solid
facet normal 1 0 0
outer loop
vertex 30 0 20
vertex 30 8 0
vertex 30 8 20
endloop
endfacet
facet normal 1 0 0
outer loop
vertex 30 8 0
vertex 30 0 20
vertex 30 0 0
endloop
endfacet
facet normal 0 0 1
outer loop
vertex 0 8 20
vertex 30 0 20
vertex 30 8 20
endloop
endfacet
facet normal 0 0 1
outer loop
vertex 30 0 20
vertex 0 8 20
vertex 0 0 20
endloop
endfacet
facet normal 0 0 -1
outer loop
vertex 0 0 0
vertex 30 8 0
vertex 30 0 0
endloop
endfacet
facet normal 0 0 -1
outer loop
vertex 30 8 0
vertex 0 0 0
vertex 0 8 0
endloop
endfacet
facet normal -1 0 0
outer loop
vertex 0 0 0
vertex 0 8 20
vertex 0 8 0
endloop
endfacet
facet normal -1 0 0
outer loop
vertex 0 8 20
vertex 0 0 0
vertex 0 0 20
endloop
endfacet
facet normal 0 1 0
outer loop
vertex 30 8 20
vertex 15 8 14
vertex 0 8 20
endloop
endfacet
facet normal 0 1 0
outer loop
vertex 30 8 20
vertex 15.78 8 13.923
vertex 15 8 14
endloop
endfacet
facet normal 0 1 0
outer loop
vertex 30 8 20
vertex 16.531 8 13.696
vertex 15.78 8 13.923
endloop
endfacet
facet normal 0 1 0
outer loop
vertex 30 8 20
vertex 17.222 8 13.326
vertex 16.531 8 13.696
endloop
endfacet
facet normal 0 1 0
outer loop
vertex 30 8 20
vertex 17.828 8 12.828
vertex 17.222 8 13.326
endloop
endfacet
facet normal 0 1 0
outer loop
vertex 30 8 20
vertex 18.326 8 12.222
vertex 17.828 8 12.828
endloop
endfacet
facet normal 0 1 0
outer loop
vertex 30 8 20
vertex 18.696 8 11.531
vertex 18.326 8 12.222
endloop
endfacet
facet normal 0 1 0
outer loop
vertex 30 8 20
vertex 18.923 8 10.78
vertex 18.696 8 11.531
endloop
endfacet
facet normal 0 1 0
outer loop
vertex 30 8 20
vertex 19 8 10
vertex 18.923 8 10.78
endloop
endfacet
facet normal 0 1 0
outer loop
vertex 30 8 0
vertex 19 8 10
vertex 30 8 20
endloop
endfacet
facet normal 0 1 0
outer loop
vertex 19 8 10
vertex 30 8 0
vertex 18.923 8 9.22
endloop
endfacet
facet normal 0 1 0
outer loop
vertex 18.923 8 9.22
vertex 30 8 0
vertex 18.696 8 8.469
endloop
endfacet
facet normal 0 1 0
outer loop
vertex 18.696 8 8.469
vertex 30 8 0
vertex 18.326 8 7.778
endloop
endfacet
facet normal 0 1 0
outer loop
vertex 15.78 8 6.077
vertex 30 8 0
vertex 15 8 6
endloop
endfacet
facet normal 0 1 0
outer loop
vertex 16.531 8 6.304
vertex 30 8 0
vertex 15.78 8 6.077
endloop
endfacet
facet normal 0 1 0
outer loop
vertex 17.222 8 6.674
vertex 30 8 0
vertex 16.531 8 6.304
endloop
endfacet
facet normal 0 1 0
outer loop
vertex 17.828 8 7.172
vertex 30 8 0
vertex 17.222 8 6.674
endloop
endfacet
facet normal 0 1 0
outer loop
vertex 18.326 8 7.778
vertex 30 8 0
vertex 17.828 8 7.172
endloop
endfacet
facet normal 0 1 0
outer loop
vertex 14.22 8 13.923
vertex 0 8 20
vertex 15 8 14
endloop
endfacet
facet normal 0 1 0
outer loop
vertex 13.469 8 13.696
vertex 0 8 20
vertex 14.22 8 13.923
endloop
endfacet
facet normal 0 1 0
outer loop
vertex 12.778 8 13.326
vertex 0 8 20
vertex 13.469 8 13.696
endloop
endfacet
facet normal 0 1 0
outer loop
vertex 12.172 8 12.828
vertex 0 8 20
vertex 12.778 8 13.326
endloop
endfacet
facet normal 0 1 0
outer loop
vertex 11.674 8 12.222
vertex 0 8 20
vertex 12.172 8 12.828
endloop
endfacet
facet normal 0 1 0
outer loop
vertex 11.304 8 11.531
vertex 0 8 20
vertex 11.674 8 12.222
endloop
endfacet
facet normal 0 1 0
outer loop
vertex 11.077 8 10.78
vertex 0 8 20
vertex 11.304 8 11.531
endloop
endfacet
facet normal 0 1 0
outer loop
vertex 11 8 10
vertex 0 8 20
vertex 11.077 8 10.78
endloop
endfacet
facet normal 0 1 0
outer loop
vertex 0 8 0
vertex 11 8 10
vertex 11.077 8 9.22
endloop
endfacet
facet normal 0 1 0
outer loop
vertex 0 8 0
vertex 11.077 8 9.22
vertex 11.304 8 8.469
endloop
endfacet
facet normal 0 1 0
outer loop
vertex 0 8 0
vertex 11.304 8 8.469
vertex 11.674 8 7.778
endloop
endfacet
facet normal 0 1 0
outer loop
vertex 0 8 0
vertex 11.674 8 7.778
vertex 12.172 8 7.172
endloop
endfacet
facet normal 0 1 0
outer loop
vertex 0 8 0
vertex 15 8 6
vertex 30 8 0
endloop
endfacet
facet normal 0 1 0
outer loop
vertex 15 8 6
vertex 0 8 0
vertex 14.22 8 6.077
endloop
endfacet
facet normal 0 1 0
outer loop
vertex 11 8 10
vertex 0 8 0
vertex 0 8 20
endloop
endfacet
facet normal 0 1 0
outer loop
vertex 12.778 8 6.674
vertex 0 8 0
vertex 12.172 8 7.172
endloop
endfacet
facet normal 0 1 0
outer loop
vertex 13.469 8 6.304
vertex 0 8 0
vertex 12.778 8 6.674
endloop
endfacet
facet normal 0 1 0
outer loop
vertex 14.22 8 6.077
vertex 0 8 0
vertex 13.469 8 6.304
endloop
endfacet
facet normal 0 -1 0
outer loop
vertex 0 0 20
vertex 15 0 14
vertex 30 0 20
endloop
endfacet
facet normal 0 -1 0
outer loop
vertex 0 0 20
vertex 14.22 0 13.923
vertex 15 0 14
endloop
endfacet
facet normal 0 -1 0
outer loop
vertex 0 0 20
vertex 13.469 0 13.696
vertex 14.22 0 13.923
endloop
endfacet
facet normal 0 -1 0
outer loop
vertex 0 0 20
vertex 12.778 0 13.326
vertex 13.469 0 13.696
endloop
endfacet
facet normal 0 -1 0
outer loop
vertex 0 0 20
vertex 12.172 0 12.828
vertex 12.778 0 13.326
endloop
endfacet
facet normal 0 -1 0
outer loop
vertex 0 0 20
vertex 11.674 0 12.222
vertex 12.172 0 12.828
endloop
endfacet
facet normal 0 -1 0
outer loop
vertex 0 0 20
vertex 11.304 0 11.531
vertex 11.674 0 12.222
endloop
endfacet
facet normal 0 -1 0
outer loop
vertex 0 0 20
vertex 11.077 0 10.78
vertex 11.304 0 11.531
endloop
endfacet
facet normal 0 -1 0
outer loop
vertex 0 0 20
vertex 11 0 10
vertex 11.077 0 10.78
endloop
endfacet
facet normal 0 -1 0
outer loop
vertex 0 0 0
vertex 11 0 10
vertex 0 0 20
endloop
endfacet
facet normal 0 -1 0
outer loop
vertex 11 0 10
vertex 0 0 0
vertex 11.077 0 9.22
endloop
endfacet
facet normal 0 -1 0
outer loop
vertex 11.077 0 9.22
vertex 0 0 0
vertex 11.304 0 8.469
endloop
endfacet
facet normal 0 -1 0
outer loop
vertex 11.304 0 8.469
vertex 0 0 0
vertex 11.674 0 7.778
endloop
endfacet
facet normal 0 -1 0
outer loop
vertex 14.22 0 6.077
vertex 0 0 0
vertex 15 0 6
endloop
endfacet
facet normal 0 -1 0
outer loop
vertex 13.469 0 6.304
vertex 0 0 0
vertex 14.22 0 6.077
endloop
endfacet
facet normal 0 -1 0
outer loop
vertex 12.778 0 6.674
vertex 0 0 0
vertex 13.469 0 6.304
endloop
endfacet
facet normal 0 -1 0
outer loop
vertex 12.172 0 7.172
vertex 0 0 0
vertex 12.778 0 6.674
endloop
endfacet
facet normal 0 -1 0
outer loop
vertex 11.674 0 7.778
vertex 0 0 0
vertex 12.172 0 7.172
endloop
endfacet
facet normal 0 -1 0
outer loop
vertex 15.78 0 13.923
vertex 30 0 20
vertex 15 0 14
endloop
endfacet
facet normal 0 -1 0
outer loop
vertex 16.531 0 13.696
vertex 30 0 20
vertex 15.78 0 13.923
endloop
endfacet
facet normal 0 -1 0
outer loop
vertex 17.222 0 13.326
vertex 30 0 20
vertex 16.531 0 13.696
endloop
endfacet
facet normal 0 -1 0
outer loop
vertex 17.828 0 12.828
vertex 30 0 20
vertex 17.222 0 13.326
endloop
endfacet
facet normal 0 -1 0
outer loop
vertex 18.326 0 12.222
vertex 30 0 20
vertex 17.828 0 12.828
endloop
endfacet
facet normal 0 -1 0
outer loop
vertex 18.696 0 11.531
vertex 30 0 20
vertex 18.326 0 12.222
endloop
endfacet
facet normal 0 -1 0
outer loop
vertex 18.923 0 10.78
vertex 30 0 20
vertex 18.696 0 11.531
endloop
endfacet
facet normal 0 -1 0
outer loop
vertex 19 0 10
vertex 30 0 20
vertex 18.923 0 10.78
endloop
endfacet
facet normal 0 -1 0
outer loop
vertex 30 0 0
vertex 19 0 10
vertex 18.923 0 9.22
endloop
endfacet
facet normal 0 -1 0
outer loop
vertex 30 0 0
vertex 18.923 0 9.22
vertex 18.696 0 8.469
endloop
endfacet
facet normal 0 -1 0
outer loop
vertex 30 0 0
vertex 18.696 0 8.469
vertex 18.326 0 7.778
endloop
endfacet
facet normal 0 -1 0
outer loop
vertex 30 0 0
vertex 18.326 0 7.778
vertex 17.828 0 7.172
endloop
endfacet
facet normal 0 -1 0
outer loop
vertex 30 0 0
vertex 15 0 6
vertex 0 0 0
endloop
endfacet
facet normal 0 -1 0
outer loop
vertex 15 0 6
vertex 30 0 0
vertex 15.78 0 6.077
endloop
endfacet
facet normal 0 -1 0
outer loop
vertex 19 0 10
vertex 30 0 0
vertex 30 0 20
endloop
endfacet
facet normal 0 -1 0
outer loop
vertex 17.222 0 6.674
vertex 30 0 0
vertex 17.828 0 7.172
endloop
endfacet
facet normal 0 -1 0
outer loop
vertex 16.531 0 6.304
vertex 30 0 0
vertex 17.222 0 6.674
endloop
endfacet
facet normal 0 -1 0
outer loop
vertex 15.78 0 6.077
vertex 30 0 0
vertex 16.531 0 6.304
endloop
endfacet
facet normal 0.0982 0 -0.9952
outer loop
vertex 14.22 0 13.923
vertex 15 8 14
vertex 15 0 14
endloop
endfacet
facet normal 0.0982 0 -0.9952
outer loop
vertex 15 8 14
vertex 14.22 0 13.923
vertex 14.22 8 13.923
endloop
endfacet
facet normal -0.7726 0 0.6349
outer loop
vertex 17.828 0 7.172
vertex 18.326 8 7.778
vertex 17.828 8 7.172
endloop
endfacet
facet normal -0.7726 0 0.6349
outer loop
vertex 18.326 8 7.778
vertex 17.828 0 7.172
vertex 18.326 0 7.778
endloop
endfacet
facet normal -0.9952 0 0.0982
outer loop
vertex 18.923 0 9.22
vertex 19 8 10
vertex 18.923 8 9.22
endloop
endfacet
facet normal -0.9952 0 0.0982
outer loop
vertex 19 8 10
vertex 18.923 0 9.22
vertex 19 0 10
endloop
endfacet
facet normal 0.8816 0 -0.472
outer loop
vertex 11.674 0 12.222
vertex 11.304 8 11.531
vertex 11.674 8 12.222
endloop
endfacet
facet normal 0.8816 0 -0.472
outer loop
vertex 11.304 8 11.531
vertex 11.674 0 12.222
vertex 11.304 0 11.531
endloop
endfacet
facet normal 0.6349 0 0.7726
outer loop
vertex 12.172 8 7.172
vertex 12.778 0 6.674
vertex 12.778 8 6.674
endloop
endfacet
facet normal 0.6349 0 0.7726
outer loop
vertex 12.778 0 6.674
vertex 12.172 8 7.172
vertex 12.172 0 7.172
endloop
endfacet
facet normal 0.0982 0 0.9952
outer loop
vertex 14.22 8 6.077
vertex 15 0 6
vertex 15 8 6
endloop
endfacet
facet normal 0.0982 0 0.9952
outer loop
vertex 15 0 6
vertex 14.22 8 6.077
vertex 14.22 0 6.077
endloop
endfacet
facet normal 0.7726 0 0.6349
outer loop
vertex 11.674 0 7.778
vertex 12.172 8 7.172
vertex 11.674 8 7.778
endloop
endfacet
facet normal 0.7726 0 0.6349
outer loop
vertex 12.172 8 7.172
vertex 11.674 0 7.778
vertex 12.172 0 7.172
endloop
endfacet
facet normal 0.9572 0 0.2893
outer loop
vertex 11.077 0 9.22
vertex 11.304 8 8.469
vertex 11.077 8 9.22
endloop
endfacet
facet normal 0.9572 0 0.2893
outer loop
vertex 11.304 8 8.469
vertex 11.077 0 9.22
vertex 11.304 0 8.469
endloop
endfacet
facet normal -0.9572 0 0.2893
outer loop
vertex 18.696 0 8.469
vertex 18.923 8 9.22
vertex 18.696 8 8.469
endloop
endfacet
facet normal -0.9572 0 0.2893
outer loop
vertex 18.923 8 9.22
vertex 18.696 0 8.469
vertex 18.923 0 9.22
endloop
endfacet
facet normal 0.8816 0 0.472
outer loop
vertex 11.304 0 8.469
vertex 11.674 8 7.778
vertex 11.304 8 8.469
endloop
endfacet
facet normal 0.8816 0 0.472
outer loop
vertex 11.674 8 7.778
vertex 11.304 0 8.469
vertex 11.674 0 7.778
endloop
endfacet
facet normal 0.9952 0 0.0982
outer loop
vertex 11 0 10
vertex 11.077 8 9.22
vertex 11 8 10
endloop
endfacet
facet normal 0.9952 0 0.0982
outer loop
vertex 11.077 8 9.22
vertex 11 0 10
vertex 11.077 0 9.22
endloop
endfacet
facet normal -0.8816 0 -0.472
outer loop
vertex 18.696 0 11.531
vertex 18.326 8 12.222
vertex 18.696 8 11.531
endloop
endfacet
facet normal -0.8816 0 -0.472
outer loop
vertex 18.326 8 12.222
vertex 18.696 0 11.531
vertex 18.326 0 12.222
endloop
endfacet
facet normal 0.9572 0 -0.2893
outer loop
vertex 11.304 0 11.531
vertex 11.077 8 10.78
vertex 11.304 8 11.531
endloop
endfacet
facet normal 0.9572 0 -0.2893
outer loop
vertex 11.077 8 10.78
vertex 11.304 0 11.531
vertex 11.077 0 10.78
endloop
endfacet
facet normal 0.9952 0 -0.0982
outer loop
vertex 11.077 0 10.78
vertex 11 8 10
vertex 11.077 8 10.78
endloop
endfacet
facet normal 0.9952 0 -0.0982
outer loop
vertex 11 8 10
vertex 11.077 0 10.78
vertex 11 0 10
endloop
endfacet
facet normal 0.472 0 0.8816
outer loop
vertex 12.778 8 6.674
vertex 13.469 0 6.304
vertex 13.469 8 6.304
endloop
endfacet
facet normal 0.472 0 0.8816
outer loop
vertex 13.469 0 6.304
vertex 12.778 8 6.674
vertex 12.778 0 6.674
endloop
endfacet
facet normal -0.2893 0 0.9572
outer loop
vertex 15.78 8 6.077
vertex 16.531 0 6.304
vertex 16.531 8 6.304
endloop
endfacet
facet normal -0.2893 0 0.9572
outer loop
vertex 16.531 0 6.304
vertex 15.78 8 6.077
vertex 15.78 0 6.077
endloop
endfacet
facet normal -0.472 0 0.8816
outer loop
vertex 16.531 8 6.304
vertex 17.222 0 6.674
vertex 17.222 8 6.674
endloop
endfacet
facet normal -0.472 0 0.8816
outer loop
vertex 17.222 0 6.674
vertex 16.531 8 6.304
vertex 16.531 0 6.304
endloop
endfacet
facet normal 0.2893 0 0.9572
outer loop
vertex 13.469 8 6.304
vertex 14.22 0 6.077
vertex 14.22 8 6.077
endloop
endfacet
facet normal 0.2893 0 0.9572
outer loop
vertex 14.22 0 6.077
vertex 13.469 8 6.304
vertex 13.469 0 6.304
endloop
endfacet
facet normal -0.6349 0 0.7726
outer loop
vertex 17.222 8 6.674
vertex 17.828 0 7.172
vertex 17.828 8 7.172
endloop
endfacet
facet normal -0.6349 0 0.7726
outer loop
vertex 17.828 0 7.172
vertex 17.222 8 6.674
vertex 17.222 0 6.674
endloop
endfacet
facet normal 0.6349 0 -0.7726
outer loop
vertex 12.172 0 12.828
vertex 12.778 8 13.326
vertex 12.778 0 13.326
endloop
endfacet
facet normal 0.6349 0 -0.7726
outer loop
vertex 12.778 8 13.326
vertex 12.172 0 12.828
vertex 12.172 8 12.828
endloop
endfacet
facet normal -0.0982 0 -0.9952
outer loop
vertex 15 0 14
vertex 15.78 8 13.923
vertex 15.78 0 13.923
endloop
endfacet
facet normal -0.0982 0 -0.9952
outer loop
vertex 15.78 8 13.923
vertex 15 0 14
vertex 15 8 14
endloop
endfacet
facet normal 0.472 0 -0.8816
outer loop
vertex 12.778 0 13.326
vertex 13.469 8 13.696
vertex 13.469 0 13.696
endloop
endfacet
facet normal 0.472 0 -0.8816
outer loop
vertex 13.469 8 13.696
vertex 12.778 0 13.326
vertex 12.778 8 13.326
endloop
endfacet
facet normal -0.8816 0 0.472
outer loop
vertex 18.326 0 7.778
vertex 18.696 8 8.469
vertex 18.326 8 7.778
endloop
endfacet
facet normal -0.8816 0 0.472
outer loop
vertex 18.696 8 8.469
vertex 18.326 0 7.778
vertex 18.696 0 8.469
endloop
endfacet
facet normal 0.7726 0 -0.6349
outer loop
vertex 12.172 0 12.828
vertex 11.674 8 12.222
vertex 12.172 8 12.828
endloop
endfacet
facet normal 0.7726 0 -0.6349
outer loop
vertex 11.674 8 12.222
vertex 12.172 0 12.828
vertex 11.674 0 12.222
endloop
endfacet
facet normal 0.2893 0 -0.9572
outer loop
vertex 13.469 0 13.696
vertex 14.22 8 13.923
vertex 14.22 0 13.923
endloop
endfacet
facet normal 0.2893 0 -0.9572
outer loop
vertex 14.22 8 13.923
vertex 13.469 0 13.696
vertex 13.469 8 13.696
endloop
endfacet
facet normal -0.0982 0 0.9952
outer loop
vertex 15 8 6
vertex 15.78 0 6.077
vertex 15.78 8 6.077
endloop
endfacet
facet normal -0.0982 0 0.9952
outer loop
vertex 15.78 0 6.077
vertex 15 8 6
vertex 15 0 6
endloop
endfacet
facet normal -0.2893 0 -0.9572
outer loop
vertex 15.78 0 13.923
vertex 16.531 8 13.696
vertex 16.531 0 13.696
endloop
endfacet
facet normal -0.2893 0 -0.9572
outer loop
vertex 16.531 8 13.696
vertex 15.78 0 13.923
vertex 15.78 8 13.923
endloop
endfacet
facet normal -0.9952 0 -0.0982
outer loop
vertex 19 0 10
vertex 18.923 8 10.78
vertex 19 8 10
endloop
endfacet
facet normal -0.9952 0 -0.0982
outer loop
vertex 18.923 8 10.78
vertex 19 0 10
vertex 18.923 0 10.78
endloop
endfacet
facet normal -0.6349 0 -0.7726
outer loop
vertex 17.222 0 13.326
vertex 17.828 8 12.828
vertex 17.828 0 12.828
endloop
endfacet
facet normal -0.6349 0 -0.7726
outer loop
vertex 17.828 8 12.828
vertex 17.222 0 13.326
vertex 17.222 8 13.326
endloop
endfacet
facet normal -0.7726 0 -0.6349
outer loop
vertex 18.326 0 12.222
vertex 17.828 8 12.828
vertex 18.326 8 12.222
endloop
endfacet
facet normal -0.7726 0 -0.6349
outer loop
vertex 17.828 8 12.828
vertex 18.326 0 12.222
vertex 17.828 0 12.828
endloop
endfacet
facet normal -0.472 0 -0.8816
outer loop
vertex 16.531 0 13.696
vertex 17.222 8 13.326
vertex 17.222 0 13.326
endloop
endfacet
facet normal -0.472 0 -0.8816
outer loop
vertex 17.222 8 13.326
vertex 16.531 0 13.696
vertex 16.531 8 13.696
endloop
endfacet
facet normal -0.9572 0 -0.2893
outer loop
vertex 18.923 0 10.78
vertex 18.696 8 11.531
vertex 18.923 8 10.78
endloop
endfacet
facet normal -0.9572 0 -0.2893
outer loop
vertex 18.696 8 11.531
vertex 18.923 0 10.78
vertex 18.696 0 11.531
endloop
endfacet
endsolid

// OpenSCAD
// A 30 x 8 x 20 plate standing on its edge, with a pin hole through its thickness (along y).
//
// teardrop = false: the hole is round. The facets of its roof face down at up to 84 degrees from
//   vertical, past the 45 degree limit of an FDM printer, so QC reads them as an overhang and
//   attributes it to the "pin hole" feature declared below.
// teardrop = true: the hole's upper half is a house shape: vertical walls, then two flats rising
//   at 45 degrees to meet over the hole. The flats sit exactly at the limit, on whole-number
//   coordinates, so the mesh states their angle exactly and QC passes them.
teardrop = false;

// OpenSCAD cannot import agentcad, so the feature is declared with echo; the engine reads the line
// back from the output. The box is in the part's own frame (x0, y0, z0, x1, y1, z1).
echo("AGENTCAD_QC", "feature", name="pin hole", box=[9, -1, 6, 21, 9, 19], kind="hole",
     why="a pin runs through it");

difference() {
    cube([30, 8, 20]);
    translate([15, 9, 10]) rotate([90, 0, 0]) linear_extrude(10)
        union() {
            circle(r=4, $fn=32);
            if (teardrop) polygon([[-4, 0], [4, 0], [4, 4], [0, 8], [-4, 4]]);
        }
}
